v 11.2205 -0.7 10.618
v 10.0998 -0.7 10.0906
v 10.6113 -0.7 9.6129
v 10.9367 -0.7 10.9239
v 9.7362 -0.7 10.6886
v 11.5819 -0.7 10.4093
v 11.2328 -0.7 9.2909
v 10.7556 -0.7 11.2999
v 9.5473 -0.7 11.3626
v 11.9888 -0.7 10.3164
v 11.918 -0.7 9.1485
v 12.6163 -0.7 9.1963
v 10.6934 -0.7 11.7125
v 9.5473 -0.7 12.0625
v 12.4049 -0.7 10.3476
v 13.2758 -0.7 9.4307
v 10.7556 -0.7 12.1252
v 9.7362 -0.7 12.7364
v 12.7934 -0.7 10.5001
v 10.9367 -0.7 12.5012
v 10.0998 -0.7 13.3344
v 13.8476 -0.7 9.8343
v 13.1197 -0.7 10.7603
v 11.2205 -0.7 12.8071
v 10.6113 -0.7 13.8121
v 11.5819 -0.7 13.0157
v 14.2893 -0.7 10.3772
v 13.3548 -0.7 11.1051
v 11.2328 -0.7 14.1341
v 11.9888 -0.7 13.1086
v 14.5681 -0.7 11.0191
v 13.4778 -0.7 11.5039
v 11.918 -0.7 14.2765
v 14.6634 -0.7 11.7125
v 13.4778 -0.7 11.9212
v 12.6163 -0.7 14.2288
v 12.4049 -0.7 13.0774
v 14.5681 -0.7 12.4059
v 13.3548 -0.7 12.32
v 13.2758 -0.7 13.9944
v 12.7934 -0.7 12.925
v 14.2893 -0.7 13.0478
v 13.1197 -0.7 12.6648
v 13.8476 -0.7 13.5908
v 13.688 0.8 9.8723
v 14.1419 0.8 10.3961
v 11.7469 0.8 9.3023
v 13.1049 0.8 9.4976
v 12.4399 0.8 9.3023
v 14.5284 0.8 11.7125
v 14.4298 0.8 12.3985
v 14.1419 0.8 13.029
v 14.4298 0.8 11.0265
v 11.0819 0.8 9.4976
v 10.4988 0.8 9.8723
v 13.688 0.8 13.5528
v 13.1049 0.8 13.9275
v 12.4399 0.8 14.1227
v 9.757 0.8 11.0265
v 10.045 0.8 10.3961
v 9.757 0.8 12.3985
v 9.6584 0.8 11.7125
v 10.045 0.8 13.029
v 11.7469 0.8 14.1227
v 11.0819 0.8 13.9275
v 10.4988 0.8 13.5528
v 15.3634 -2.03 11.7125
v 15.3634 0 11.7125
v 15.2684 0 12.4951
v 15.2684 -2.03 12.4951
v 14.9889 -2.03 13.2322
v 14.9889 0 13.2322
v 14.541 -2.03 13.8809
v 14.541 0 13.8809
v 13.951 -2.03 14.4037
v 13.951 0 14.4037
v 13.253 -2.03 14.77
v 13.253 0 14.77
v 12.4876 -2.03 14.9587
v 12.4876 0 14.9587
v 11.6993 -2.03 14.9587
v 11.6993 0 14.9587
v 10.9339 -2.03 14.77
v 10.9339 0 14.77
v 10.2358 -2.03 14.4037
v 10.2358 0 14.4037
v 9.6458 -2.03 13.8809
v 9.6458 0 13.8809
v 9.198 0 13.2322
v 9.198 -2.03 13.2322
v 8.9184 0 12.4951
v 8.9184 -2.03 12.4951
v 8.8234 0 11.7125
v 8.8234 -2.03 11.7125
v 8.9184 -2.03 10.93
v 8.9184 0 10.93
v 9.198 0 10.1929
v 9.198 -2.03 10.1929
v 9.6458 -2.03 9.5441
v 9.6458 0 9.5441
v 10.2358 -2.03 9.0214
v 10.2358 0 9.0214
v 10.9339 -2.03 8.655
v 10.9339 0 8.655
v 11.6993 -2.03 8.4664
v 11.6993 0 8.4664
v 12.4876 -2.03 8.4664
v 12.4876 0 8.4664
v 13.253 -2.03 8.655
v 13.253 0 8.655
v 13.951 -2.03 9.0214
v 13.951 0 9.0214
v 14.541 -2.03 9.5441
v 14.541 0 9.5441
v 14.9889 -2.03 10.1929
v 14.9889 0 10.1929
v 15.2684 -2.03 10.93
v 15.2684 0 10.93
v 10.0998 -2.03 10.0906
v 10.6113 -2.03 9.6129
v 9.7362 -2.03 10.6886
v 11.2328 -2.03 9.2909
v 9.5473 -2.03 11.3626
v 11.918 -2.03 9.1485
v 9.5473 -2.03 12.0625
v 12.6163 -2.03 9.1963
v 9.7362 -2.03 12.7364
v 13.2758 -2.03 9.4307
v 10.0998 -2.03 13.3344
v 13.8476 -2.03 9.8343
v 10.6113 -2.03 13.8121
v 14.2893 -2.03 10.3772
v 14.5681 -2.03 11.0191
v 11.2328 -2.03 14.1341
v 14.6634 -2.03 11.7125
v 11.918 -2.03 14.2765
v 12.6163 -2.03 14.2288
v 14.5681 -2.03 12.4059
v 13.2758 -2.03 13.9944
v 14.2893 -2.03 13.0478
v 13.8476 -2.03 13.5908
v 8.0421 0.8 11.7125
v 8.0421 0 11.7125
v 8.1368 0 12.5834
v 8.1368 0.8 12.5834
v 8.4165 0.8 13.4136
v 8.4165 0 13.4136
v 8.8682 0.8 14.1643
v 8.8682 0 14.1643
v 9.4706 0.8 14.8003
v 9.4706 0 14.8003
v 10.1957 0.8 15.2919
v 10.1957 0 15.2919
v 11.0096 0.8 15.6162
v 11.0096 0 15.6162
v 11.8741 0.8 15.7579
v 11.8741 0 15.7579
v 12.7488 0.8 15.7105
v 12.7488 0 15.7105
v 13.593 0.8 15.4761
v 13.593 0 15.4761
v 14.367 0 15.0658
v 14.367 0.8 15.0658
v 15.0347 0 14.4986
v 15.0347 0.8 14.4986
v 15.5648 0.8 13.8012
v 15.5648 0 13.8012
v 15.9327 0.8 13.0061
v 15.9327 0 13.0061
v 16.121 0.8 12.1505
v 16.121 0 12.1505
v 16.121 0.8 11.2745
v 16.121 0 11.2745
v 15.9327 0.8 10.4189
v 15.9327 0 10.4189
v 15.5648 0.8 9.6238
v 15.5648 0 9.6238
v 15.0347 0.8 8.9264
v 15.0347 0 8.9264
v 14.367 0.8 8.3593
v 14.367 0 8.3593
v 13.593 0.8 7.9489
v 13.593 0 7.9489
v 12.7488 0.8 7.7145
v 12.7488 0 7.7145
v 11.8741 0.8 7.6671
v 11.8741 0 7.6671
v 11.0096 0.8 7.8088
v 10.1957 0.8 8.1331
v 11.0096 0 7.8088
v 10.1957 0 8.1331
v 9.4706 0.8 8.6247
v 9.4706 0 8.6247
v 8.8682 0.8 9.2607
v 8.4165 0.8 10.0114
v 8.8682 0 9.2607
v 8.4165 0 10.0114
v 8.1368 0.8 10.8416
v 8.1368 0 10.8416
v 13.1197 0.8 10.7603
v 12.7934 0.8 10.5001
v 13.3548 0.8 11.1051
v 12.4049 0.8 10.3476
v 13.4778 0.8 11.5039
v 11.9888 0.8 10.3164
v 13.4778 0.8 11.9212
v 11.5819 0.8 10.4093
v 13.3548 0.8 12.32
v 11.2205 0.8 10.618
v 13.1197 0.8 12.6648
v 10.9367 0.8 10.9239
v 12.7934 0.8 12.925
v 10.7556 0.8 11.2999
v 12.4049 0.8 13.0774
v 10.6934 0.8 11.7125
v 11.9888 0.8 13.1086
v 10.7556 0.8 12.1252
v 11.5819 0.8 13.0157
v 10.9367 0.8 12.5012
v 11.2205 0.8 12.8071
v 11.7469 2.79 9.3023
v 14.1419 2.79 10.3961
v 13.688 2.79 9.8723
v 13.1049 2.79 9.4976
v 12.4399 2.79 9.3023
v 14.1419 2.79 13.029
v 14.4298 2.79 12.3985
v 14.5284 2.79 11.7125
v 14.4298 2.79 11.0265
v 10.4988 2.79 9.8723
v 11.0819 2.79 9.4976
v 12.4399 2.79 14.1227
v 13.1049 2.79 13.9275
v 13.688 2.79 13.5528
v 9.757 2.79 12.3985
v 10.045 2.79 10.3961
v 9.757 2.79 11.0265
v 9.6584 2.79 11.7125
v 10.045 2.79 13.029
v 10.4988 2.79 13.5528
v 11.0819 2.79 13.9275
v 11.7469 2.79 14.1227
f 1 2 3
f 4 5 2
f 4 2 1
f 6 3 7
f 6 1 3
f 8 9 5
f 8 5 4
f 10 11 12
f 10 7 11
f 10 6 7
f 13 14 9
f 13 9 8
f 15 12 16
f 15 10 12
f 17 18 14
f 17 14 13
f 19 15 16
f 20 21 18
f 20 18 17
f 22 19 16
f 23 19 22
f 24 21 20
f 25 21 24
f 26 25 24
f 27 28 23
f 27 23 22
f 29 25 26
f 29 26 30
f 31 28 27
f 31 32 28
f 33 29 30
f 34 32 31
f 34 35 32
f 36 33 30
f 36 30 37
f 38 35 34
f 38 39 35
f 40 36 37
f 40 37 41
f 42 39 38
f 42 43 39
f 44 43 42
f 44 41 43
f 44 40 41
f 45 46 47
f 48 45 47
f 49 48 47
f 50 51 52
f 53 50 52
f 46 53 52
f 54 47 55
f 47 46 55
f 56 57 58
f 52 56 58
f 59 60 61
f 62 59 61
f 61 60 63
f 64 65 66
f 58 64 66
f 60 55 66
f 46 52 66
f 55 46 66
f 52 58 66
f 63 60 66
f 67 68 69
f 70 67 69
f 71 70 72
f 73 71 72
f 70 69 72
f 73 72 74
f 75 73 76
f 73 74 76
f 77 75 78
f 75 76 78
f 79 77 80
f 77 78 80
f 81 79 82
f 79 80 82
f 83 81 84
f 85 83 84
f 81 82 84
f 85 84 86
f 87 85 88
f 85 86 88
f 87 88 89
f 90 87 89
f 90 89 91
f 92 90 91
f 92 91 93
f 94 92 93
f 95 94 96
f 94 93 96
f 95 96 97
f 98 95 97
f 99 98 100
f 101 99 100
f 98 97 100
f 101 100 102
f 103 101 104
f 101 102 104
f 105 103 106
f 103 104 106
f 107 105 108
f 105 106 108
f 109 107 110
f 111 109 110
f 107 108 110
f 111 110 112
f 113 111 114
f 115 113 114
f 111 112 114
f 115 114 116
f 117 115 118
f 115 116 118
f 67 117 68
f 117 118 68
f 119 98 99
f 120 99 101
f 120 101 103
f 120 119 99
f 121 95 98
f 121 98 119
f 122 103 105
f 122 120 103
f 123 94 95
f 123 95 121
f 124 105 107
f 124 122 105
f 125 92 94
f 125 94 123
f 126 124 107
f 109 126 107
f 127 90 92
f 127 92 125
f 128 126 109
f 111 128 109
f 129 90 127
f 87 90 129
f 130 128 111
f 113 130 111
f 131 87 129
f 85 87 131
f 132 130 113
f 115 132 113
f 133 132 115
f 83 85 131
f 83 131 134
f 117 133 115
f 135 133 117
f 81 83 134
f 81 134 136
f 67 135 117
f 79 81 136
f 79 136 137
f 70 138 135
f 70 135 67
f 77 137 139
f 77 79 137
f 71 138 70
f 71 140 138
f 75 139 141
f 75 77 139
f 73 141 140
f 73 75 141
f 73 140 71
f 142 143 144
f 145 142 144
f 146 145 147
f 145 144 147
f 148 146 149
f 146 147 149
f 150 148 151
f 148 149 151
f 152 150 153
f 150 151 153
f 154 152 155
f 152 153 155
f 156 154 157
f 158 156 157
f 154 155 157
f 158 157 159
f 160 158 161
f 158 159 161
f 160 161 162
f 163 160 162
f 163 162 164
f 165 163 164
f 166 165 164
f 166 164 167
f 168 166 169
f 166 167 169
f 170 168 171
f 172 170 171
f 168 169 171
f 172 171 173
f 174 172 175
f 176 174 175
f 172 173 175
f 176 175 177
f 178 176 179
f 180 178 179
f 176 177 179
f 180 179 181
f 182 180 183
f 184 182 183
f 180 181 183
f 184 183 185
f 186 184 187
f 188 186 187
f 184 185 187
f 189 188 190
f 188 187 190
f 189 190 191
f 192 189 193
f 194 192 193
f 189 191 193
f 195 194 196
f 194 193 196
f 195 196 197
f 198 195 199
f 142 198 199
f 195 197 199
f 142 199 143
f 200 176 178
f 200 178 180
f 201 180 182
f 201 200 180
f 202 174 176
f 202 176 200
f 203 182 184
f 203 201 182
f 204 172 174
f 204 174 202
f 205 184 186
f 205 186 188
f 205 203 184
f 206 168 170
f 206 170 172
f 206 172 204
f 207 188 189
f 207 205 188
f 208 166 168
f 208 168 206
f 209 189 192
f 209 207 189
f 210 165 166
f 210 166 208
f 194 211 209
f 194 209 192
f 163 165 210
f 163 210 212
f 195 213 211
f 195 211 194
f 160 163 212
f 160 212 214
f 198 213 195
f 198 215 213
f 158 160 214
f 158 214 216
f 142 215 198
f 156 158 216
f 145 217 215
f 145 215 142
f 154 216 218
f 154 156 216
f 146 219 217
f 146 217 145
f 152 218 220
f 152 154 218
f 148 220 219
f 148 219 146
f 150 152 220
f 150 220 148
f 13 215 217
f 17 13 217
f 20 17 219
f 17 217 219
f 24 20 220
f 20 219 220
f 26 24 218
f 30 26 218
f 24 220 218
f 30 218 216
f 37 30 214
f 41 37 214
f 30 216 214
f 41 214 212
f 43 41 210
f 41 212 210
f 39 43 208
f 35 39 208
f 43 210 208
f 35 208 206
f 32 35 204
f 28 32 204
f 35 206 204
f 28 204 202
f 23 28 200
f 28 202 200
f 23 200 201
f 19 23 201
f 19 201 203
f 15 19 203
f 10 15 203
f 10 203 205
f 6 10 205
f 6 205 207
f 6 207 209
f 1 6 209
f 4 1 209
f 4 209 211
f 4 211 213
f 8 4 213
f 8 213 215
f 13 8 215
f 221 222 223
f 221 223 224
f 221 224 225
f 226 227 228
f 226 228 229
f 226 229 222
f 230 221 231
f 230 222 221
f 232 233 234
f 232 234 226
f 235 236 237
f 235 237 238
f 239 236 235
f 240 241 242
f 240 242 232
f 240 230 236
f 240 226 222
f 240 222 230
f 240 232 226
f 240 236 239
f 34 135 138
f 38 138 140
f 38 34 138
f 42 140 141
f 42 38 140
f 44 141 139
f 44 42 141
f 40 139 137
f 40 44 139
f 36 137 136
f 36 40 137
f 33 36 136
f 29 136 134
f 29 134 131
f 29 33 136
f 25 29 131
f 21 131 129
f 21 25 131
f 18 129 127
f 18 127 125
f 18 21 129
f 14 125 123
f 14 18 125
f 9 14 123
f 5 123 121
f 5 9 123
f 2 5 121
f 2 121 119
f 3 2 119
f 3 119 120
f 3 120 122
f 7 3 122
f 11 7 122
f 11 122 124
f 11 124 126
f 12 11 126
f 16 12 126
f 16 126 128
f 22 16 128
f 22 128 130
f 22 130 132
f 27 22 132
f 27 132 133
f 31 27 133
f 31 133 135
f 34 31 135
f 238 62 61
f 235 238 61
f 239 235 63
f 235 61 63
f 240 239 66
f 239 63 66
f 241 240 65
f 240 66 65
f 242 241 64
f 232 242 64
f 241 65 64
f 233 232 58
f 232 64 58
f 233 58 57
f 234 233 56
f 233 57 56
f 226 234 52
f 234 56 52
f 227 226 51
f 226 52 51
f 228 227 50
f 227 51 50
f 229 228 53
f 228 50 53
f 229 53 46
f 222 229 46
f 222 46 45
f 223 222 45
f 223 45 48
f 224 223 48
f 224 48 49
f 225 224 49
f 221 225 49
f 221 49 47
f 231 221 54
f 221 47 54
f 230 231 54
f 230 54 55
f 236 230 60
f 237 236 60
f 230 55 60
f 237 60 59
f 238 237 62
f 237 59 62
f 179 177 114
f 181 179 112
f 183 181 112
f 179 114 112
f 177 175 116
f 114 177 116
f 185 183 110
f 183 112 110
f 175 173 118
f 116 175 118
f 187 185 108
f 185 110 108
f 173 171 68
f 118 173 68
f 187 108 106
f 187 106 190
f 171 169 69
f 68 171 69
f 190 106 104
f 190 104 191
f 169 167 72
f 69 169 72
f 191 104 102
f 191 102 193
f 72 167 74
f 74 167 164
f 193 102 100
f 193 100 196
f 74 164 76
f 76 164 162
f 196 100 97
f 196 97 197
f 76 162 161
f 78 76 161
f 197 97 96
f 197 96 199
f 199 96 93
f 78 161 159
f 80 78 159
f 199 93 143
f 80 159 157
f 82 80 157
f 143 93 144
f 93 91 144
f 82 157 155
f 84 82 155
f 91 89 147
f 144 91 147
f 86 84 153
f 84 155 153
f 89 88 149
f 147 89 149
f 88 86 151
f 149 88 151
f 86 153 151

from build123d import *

# Parameters (mm, degrees)
F0_R      = 3.27
F1_DEPTH  = 2.03
F2_T      = -0.7
F3_R      = 4.0513442958
F2_FACE_R = 2.57
F4_DEPTH  = 0.8
F5_R      = 1.4
F6_DEPTH  = 25
F7_R      = 2.435
F7_R_2    = 1.4
F8_DEPTH  = 1.99


with BuildPart() as f1:
    # F0 (on Front) → F1 (new body)
    with BuildSketch(Plane.XZ):
        with Locations((12.0934098959, 11.7125157267)):
            Circle(F0_R)
    extrude(amount=F1_DEPTH)

    # F2
    f2_openings = [f1.faces().sort_by_distance(p)[0] for p in [
        (12.09341, -2.03, 11.712516),
    ]]
    offset(amount=F2_T, openings=f2_openings)

    # F3 (on face) + F2_face (on face) → F4 (join)
    with BuildSketch(Plane(origin=(0, 0, 0), x_dir=(-1, 0, 0), z_dir=(0, 1, 0))):
        with Locations((-12.0934098959, 11.7125157267)):
            Circle(F3_R)
    with BuildSketch(Plane(origin=(12.0934098959, -0.7, 11.7125157267), x_dir=(1, 0, 0), z_dir=(0, -1, 0))):
        Circle(F2_FACE_R)
    extrude(amount=F4_DEPTH, dir=(0, 1, 0))

    # F5 (on face) → F6 (cut)
    with BuildSketch(Plane(origin=(0, 0.8, 0), x_dir=(-1, 0, 0), z_dir=(0, 1, 0))):
        with Locations((-12.0934098959, 11.7125157267)):
            Circle(F5_R)
    extrude(amount=-F6_DEPTH, mode=Mode.SUBTRACT)


with BuildPart() as f8:
    # F7 (on face) → F8 (new body)
    with BuildSketch(Plane(origin=(0, 0.8, 0), x_dir=(-1, 0, 0), z_dir=(0, 1, 0))):
        with Locations((-12.0934098959, 11.7125157267)):
            Circle(F7_R)
        with Locations((-12.0934098959, 11.7125157267)):
            Circle(F7_R_2, mode=Mode.SUBTRACT)
        with Locations((-12.0934098959, 11.7125157267)):
            Circle(F7_R_2)
    extrude(amount=F8_DEPTH)


solid = Compound([f1.part, f8.part])
